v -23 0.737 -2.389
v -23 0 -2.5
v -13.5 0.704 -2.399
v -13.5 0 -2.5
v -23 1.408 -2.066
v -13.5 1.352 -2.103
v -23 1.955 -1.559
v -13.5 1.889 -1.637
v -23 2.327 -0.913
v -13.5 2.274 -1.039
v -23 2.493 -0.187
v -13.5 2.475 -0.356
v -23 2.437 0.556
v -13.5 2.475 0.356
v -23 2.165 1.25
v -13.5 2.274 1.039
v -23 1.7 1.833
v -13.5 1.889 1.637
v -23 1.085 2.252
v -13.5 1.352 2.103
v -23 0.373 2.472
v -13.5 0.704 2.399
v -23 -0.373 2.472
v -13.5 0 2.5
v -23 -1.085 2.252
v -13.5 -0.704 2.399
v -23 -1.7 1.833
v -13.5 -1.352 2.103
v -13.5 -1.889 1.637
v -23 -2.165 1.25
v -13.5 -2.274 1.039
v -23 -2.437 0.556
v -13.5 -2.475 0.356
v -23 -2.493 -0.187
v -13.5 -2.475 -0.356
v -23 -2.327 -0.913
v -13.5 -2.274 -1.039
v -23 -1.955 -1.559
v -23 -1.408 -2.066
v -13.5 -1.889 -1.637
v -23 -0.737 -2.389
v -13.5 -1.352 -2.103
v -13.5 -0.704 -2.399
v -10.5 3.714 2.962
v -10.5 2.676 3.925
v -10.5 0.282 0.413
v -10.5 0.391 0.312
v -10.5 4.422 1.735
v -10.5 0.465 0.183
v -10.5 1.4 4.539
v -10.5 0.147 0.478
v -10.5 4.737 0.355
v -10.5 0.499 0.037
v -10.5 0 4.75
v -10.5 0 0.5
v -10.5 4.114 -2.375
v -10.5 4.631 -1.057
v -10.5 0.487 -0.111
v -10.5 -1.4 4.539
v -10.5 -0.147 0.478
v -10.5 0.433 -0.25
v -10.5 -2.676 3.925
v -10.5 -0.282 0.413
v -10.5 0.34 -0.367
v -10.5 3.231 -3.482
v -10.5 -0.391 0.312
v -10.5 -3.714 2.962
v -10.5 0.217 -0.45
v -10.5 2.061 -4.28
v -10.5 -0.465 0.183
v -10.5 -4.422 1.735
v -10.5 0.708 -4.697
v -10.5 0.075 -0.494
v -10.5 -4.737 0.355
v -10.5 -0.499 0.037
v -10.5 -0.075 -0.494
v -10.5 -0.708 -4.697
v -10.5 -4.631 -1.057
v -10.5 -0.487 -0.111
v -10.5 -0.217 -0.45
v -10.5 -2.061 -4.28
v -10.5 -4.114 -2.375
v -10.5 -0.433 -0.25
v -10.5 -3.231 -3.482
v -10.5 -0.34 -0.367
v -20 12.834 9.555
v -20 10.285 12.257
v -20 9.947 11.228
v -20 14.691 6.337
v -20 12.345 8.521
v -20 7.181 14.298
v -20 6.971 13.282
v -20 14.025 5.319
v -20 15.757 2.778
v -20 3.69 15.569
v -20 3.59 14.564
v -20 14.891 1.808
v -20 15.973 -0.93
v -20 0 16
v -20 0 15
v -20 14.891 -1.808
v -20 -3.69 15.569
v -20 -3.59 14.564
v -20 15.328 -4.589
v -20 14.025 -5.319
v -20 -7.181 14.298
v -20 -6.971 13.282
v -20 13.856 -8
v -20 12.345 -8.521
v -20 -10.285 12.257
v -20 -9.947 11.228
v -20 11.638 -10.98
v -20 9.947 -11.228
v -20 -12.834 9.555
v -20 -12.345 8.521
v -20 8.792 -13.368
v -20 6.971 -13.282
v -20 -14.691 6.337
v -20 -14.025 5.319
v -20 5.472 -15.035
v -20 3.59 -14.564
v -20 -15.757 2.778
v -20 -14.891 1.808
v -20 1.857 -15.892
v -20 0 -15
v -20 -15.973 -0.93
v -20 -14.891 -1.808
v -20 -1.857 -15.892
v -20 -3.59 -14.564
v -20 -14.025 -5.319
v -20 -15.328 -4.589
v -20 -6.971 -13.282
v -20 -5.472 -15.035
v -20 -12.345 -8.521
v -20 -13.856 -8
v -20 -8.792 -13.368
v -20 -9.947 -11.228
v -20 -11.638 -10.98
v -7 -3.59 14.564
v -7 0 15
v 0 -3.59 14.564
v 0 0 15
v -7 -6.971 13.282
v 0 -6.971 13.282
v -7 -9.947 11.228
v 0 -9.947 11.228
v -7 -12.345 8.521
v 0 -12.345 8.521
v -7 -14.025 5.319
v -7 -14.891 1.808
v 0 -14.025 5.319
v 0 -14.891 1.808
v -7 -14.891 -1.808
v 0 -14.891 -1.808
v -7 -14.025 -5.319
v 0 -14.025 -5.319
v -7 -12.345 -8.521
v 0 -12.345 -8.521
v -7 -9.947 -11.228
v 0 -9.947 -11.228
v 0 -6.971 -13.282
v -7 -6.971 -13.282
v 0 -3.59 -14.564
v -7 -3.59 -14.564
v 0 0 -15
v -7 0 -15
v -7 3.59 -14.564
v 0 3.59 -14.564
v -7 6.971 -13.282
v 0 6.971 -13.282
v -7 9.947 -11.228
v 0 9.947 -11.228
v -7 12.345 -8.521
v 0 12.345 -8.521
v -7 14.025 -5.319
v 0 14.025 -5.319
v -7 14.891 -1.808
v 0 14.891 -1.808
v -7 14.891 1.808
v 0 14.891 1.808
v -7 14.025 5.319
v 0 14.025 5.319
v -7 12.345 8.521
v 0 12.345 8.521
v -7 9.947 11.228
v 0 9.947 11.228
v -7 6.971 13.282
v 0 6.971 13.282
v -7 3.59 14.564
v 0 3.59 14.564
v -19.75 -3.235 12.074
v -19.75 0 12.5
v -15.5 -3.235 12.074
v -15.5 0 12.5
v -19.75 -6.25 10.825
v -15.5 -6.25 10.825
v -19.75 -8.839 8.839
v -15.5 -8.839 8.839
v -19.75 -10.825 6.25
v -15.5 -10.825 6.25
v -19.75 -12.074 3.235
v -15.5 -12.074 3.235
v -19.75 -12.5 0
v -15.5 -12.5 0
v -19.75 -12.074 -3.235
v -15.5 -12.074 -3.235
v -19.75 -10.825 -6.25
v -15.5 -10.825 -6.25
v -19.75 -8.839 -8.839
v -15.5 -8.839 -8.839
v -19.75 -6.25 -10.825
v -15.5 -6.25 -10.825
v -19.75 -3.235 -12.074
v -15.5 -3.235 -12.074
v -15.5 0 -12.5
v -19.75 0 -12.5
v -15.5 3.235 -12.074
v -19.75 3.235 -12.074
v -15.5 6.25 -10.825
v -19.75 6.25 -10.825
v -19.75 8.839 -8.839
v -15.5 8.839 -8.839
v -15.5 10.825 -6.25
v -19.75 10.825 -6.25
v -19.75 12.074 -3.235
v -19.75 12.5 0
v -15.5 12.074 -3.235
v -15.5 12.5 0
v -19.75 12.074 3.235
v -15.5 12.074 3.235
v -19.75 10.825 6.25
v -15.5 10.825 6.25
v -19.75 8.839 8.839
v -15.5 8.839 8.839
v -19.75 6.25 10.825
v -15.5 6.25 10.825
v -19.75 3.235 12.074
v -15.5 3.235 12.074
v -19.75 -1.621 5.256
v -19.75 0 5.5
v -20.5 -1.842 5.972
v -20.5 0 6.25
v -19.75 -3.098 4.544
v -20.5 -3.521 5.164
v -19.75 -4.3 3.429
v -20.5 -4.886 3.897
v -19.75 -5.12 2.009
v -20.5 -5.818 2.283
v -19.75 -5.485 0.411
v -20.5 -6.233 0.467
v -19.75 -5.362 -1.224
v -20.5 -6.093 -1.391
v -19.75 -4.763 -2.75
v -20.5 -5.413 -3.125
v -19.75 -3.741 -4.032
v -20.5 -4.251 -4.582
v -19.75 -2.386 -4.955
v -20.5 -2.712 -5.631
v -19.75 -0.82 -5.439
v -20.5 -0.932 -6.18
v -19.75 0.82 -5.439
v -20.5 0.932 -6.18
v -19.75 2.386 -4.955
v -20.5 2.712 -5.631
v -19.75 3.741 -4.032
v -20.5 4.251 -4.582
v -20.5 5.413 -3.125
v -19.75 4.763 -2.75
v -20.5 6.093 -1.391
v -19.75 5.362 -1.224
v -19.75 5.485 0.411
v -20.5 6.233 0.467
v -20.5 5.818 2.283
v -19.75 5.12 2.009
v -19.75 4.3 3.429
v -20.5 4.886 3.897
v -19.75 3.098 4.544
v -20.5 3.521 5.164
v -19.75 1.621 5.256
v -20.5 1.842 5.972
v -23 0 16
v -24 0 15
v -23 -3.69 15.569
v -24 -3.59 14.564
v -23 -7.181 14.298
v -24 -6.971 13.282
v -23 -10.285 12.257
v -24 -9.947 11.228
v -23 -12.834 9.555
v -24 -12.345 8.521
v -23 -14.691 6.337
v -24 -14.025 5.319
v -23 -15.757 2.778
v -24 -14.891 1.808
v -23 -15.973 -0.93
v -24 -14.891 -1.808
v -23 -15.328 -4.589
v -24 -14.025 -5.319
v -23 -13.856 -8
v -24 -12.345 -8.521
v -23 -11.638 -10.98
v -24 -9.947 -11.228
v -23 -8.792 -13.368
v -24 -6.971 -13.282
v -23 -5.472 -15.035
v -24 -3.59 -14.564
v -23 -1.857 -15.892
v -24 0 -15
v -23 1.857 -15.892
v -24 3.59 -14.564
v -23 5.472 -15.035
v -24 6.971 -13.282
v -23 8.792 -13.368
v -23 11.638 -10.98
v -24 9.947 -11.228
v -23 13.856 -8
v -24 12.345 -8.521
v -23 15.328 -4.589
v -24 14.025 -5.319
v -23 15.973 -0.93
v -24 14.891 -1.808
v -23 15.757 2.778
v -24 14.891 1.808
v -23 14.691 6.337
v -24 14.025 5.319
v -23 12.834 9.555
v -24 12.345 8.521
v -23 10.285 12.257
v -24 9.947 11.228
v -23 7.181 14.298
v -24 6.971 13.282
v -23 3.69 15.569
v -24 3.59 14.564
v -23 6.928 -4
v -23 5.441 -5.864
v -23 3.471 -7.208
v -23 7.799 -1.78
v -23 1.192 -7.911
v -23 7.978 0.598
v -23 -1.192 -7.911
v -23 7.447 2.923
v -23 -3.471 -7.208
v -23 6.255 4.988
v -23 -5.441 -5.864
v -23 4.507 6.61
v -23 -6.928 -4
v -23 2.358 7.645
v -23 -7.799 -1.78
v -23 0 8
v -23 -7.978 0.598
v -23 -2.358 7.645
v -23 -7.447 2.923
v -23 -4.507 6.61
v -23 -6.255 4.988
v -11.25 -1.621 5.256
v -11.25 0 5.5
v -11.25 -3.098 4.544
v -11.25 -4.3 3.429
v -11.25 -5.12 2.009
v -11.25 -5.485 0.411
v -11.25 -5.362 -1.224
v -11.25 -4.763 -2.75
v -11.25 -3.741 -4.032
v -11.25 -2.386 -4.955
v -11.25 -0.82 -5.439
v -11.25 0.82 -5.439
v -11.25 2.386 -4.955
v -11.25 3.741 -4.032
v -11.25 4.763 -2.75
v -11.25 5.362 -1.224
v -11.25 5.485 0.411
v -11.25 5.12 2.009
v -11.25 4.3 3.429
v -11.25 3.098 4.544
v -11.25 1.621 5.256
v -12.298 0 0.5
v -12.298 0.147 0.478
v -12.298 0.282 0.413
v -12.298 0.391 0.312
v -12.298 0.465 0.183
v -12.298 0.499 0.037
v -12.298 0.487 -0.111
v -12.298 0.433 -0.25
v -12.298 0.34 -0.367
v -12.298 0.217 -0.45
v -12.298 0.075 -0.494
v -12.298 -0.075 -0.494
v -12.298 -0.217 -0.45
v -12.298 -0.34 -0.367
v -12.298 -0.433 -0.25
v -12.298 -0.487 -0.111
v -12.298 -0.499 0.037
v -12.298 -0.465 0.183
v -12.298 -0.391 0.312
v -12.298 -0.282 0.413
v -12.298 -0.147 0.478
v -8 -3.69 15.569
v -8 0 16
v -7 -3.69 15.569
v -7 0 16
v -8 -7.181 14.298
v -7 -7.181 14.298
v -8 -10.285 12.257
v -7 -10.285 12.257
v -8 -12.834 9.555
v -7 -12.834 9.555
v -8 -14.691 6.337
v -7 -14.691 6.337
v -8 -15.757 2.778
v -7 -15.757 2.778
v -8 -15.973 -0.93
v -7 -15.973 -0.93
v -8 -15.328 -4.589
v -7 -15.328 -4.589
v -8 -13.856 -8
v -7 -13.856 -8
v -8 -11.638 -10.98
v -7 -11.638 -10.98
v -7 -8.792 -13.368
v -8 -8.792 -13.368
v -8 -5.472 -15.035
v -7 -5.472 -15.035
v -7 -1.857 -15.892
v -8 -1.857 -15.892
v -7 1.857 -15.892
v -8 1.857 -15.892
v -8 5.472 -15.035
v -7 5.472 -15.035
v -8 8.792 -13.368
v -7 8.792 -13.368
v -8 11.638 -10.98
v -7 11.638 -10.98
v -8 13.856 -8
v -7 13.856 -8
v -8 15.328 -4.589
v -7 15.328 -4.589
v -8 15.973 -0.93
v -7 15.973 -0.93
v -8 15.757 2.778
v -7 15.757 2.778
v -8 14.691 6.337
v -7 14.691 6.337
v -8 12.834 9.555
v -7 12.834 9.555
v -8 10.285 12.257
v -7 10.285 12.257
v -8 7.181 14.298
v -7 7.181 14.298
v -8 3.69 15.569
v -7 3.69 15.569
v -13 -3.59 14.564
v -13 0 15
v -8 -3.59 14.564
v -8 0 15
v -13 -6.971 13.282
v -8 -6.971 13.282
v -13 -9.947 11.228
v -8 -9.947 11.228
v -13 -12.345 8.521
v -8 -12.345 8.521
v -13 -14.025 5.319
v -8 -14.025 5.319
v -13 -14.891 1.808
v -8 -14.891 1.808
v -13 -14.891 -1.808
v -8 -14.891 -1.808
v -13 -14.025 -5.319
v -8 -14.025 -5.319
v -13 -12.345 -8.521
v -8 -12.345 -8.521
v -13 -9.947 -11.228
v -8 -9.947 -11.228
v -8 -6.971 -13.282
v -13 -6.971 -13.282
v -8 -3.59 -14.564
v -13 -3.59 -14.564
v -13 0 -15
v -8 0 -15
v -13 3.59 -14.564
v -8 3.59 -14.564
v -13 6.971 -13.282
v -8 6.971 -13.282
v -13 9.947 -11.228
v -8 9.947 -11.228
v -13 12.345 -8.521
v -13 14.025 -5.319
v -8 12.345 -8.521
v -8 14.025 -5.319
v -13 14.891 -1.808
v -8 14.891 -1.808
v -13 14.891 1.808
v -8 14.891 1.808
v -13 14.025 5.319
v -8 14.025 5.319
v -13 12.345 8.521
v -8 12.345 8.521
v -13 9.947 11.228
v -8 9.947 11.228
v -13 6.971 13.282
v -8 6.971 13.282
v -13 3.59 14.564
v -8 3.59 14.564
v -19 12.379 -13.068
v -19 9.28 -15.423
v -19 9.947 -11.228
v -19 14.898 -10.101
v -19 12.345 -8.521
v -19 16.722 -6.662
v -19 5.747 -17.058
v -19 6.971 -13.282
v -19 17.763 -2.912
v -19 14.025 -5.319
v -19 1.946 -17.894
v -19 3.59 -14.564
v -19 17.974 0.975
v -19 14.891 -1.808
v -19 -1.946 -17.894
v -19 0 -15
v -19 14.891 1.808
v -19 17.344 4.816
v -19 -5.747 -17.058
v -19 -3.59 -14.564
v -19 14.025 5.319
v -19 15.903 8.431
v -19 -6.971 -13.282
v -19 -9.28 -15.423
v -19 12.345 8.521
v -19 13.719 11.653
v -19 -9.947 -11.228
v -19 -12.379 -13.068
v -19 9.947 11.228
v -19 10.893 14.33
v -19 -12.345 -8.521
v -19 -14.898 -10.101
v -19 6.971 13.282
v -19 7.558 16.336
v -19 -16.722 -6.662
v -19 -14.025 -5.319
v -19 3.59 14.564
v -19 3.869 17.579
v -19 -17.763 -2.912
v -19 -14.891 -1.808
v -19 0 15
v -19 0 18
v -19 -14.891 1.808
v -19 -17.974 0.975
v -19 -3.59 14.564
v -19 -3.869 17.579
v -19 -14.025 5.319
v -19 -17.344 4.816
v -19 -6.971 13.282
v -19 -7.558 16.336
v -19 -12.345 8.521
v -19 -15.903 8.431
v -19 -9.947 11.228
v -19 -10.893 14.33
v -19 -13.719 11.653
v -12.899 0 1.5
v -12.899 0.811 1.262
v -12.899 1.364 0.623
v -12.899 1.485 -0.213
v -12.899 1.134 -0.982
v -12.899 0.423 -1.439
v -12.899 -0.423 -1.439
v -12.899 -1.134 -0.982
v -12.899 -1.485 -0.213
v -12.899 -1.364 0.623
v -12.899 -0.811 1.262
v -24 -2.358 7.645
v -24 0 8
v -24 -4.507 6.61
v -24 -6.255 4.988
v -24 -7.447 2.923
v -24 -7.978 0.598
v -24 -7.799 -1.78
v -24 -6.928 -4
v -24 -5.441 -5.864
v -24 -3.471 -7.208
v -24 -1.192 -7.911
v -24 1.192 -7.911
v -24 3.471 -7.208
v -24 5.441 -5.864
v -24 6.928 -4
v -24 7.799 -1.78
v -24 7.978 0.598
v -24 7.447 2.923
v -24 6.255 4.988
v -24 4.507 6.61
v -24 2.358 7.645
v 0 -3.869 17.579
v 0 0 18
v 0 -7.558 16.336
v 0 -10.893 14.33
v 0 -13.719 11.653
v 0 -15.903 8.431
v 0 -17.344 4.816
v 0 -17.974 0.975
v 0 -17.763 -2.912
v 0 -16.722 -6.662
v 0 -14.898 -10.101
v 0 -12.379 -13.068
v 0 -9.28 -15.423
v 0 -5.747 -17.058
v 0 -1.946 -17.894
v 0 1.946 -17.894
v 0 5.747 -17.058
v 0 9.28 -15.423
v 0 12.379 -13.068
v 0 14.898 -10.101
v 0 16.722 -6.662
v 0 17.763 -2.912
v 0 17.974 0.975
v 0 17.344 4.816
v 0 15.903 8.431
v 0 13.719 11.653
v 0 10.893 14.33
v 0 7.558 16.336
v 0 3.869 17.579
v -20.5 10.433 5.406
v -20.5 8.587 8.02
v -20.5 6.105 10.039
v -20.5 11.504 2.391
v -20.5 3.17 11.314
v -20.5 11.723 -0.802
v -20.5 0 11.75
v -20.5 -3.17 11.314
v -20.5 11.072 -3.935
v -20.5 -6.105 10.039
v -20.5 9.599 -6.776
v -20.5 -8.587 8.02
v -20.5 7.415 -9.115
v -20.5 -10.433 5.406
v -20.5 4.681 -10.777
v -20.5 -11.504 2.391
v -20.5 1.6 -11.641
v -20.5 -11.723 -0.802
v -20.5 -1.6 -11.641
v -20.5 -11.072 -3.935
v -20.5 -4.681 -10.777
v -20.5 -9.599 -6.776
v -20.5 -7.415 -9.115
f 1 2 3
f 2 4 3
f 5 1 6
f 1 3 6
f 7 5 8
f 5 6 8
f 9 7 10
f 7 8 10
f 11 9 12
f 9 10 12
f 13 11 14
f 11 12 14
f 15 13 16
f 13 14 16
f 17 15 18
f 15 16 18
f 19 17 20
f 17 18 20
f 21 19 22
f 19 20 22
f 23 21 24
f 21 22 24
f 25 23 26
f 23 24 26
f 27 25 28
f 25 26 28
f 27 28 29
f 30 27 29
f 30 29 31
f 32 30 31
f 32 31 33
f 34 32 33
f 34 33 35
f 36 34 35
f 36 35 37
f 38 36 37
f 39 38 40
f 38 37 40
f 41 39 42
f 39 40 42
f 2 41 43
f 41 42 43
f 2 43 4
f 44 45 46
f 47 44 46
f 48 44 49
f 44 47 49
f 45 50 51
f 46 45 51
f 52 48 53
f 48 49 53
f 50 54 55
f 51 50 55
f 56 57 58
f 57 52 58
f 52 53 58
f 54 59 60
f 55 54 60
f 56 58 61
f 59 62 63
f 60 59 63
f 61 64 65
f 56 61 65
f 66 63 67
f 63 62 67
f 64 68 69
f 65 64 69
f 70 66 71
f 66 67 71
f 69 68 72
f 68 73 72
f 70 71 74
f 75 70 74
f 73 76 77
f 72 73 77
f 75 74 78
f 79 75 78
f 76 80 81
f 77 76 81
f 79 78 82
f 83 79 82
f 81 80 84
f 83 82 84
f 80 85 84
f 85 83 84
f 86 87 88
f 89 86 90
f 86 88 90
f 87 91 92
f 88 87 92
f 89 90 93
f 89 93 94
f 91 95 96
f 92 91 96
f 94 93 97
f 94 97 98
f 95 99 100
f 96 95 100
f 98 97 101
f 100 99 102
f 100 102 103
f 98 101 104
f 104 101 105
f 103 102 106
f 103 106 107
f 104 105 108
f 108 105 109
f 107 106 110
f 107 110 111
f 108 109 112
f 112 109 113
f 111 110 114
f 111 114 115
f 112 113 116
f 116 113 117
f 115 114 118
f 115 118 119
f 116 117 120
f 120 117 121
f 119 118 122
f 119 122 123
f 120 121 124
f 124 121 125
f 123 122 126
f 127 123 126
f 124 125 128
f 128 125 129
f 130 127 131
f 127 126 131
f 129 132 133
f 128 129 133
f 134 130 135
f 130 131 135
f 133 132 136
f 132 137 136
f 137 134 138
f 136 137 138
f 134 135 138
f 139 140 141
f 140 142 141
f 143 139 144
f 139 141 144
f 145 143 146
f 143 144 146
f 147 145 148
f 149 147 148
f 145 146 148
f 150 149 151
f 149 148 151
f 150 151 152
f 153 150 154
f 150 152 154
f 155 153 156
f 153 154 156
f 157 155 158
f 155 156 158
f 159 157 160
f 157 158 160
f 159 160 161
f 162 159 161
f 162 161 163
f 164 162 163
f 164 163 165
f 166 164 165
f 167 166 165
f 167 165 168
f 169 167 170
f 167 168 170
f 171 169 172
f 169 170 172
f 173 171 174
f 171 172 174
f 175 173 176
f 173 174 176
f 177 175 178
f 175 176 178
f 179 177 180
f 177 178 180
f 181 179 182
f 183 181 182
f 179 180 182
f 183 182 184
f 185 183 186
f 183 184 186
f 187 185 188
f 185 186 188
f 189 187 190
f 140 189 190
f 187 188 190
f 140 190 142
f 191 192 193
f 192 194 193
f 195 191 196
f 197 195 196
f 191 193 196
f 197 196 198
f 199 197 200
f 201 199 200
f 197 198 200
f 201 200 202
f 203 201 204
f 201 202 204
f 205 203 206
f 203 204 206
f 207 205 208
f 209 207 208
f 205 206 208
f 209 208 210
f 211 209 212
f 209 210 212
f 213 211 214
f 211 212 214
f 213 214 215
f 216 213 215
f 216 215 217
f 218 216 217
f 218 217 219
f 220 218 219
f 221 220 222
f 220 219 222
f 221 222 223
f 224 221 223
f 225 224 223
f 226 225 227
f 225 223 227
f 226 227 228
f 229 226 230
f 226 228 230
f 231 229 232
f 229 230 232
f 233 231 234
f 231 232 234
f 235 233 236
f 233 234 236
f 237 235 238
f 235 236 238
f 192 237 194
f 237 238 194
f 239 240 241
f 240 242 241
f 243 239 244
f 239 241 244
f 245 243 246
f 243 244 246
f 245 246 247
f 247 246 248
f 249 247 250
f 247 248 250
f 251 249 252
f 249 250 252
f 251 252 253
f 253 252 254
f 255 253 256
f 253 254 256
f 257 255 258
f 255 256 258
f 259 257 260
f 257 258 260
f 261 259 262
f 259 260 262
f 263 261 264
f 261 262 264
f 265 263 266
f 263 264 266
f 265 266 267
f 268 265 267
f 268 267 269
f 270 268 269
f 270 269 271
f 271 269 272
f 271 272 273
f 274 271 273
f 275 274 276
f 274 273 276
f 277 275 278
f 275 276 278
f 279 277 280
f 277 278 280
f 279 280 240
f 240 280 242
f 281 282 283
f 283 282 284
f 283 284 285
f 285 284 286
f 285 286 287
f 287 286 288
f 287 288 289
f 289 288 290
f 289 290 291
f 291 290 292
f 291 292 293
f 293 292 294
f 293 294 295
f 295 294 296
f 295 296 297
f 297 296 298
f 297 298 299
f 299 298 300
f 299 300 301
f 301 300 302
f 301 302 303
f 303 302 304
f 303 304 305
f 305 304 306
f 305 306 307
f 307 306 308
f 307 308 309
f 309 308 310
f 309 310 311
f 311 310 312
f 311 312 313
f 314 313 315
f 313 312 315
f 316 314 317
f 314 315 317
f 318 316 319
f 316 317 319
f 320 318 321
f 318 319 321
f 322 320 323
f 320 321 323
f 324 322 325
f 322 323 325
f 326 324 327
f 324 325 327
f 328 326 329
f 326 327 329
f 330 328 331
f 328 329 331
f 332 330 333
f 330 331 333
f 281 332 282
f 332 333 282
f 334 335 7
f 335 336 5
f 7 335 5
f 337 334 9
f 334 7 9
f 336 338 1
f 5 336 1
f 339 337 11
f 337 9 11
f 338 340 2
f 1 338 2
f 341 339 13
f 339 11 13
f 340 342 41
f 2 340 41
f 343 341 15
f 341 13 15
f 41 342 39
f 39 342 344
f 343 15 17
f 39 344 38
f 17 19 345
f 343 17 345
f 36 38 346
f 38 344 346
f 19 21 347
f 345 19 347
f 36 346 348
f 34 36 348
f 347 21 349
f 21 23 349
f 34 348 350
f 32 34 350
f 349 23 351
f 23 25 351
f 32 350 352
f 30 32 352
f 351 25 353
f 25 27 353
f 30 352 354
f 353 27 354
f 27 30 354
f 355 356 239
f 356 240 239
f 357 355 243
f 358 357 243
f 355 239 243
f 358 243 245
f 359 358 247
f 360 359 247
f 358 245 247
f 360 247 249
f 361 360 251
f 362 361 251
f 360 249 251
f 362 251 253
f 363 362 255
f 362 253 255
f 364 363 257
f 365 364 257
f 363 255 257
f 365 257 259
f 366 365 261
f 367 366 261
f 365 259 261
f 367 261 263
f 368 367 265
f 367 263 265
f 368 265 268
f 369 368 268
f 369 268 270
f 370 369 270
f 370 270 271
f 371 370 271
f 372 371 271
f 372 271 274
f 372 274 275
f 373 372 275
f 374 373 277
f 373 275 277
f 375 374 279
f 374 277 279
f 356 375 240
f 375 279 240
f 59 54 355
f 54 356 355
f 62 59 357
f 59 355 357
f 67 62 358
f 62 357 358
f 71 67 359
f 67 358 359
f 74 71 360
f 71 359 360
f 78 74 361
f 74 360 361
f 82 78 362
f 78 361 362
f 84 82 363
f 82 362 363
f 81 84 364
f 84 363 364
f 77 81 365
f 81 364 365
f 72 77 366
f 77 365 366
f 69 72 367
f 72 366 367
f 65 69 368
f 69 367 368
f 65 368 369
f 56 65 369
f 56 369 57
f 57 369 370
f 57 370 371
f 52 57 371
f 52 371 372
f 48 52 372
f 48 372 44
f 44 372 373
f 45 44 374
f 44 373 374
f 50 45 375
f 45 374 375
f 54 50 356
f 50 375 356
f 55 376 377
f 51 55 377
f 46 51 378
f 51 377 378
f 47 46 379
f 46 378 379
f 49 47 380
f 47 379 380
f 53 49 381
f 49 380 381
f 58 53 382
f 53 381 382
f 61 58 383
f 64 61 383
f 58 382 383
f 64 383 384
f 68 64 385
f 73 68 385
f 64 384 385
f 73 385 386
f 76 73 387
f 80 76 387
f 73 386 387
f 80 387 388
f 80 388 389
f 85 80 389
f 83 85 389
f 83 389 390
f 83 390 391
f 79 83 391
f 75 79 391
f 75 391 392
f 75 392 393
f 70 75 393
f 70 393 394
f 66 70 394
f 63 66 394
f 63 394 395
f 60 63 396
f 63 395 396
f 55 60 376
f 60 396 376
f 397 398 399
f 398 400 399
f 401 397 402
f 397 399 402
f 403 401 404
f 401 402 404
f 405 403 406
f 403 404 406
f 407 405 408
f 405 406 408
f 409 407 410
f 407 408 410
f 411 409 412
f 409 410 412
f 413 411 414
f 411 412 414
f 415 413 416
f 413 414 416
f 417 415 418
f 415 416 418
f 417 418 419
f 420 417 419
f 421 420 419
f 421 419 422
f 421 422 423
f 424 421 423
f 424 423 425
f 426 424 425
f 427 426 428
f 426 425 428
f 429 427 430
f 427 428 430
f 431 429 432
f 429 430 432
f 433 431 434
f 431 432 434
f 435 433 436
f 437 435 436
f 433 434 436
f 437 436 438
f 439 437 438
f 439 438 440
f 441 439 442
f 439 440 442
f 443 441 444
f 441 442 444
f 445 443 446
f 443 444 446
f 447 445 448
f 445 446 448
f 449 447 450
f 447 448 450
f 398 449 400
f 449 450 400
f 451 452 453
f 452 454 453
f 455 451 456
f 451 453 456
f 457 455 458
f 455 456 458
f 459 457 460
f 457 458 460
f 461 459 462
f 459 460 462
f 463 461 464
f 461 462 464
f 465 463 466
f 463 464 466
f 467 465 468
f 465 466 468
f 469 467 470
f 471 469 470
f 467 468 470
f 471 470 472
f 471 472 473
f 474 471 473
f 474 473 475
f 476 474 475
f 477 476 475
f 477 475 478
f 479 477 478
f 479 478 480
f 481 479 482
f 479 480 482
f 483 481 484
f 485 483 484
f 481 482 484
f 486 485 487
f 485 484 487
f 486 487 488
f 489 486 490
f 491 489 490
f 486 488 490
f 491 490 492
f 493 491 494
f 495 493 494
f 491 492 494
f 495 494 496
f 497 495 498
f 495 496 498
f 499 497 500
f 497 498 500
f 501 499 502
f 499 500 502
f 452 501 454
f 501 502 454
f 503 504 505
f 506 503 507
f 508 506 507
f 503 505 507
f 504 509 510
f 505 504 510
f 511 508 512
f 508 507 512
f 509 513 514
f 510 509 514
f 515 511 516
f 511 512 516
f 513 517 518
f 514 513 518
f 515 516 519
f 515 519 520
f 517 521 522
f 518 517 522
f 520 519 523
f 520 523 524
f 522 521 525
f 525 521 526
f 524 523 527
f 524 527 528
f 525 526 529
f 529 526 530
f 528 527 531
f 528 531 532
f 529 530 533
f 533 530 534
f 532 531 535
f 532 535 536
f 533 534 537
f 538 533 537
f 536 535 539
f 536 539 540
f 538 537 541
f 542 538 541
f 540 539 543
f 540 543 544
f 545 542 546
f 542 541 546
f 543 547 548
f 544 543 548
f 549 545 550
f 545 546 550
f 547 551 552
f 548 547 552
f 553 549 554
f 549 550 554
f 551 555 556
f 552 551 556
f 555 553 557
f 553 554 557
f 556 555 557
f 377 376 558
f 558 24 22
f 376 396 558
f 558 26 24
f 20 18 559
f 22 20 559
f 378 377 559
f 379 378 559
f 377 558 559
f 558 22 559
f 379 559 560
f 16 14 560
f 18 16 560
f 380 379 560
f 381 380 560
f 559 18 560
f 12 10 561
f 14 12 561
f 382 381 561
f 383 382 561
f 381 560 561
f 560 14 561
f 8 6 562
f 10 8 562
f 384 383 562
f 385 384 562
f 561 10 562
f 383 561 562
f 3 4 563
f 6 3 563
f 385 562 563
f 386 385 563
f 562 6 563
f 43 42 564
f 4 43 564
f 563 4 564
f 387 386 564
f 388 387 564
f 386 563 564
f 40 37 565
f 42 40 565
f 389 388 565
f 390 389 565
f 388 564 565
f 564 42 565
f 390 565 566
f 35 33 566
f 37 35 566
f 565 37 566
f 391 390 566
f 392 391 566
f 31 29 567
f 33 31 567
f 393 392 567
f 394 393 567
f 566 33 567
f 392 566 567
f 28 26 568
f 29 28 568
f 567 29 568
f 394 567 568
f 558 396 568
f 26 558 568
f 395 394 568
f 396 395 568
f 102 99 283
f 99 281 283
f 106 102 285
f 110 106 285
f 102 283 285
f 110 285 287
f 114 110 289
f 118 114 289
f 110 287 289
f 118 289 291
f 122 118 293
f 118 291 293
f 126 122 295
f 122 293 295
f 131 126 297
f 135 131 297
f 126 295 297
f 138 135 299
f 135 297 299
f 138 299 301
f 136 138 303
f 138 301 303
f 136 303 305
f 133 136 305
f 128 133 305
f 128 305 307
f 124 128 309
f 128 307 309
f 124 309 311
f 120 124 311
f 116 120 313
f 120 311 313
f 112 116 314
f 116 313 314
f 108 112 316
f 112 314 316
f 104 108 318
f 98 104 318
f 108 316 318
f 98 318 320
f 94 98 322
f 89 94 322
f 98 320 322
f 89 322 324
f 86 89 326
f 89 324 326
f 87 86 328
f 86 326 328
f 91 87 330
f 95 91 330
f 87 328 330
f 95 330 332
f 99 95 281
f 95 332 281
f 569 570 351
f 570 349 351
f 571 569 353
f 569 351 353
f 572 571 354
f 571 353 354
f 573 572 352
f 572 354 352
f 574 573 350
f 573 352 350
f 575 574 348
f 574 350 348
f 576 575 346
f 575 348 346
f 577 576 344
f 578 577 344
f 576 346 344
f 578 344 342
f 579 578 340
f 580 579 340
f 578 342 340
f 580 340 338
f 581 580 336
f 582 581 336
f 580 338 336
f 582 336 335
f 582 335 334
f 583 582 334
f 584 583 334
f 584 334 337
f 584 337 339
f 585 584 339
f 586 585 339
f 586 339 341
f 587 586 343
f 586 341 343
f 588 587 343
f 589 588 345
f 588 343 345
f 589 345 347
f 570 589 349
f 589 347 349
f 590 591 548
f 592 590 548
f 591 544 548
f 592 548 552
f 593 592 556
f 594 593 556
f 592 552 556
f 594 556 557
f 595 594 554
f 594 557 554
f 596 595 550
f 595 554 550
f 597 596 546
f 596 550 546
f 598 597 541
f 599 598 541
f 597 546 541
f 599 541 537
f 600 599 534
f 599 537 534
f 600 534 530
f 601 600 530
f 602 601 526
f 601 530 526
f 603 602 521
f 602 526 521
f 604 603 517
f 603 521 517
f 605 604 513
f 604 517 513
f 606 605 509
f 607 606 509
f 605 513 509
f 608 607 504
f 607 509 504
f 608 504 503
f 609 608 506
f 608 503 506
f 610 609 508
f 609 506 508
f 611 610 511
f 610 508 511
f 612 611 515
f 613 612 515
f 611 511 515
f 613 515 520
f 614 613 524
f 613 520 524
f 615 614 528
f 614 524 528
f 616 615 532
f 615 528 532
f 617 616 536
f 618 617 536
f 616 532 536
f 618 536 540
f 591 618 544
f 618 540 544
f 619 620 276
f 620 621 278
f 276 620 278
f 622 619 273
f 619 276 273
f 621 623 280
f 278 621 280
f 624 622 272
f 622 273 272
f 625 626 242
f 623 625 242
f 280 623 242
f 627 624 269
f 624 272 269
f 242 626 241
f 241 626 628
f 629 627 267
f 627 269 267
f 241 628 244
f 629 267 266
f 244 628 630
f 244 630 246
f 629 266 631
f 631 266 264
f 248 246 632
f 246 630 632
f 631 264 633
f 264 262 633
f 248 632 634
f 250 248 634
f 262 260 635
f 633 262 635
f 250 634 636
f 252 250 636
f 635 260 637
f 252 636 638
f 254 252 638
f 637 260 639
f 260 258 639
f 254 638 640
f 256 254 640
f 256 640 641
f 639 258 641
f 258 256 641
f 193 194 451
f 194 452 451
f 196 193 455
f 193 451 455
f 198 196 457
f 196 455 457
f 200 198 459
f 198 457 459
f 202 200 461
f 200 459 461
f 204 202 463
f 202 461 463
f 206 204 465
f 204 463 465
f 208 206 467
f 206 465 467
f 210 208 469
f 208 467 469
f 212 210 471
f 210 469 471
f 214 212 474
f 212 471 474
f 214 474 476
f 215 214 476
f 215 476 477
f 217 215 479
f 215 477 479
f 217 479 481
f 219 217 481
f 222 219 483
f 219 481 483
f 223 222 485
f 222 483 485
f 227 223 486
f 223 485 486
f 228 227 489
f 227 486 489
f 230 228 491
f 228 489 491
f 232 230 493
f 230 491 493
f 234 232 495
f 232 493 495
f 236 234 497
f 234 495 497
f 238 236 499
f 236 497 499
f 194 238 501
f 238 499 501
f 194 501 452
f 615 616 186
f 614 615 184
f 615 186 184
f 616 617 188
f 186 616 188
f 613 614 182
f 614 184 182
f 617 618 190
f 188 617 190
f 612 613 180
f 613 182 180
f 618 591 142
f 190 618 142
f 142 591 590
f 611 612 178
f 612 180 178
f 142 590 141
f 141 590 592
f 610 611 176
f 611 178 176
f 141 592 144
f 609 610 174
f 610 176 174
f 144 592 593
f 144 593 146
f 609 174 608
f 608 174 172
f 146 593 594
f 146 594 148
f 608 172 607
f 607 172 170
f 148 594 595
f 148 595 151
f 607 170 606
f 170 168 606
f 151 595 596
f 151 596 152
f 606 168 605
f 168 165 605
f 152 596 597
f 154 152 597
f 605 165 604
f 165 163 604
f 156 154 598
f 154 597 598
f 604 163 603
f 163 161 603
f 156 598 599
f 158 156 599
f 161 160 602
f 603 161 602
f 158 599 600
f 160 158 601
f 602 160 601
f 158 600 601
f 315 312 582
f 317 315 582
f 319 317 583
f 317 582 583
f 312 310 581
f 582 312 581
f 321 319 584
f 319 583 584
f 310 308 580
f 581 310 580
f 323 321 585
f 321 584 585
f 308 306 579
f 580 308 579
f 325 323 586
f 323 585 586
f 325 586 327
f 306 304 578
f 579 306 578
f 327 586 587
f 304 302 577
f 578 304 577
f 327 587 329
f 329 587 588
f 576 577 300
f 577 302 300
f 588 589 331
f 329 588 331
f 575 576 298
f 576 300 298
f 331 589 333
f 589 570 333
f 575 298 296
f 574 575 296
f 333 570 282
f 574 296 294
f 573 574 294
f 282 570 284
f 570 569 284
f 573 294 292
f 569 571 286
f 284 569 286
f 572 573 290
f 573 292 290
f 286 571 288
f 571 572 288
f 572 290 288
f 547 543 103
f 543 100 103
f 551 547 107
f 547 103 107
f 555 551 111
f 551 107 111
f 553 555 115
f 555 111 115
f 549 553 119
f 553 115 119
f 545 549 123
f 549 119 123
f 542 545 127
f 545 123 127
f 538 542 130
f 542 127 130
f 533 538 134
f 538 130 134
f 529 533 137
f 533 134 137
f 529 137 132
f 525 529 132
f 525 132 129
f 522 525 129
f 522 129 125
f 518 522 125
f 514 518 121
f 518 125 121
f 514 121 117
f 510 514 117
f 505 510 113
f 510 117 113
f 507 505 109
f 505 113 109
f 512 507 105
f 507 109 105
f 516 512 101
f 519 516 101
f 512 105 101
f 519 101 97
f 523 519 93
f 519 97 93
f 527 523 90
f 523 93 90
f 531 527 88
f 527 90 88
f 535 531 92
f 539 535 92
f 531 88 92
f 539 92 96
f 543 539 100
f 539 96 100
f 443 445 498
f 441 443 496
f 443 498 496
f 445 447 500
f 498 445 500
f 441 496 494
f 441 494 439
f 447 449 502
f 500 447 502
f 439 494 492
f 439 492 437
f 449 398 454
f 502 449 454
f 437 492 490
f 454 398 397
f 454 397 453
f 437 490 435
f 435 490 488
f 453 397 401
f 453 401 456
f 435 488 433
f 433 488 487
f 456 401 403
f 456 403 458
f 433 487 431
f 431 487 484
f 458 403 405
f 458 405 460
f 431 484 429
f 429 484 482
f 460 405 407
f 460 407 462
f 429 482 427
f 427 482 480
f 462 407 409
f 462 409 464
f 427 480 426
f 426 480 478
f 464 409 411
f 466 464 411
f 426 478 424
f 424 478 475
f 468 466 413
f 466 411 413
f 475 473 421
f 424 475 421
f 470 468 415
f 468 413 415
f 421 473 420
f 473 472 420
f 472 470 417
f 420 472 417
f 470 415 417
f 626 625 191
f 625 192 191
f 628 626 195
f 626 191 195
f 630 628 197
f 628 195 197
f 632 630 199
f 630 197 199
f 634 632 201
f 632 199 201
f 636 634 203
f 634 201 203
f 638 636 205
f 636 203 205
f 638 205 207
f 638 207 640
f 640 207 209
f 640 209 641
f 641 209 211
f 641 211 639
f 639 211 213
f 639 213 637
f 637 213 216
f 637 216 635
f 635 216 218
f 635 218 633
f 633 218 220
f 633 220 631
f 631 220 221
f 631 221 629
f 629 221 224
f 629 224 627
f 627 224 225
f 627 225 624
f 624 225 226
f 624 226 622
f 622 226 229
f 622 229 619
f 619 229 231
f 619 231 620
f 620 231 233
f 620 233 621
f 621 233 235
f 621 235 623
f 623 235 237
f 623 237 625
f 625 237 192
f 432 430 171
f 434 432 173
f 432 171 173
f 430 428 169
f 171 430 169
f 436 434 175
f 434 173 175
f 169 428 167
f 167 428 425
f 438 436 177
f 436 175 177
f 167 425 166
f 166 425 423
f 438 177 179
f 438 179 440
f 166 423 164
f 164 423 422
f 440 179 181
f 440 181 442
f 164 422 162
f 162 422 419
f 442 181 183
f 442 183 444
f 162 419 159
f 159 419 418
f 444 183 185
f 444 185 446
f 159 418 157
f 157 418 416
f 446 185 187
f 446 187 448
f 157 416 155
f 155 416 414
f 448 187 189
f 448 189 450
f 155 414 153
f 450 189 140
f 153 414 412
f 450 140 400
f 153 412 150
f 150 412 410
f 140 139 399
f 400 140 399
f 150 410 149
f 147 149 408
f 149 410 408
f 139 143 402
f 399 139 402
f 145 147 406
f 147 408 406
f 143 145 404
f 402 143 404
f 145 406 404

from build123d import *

# Parameters (mm, degrees)
DIAM_TRE_DU_PER_AGE_1_0_1_1_D     = 1
DIAM_TRE_DU_PER_AGE_1_0_1_1_DEPTH = 2
DIAM_TRE_DU_PER_AGE_1_0_1_1_TIP   = 0.30043031
DIAM_TRE_DU_PER_AGE_5_0_5_1_D     = 5
DIAM_TRE_DU_PER_AGE_5_0_5_1_DEPTH = 9.5
DIAM_TRE_DU_PER_AGE_5_0_5_1_TIP   = 1.502151548


with BuildPart() as part:
    # Esquisse7 → Révolution2 (revolve)
    with BuildSketch(Plane.XY, mode=Mode.PRIVATE) as r_volution2_sk:
        Polygon((0, 15), (0, 18), (-19, 18), (-19, 15), (-20, 15), (-20, 16), (-23, 16), (-24, 15), (-24, 8), (-23, 8), (-23, 0), (-10.5, 0), (-10.5, 4.75), (-11.25, 5.5), (-19.75, 5.5), (-20.5, 6.25), (-20.5, 11.75), (-19.75, 12.5), (-15.5, 12.5), (-13, 15), (-8, 15), (-8, 16), (-7, 16), (-7, 15), align=None)
    revolve(r_volution2_sk.sketch.rotate(Axis((-24, 0, 0), (1, 0, 0)), 90), axis=Axis((-24, 0, 0), (1, 0, 0)))

    # Diamètre du perçage Ø1.0 (1)1
    with Locations(Plane(origin=(-10.5, 0, 0), x_dir=(0, 0, -1), z_dir=(1, 0, 0))):
        with Locations((0, 0)):
            Hole(DIAM_TRE_DU_PER_AGE_1_0_1_1_D / 2, depth=DIAM_TRE_DU_PER_AGE_1_0_1_1_DEPTH)
            with Locations((0, 0, -(DIAM_TRE_DU_PER_AGE_1_0_1_1_DEPTH + DIAM_TRE_DU_PER_AGE_1_0_1_1_TIP / 2))):  # 118° drill point
                Cone(0, DIAM_TRE_DU_PER_AGE_1_0_1_1_D / 2, DIAM_TRE_DU_PER_AGE_1_0_1_1_TIP, mode=Mode.SUBTRACT)

    # Diamètre du perçage Ø5.0 (5)1
    with Locations(Plane.ZY.offset(23)):
        with Locations((0, 0)):
            Hole(DIAM_TRE_DU_PER_AGE_5_0_5_1_D / 2, depth=DIAM_TRE_DU_PER_AGE_5_0_5_1_DEPTH)
            with Locations((0, 0, -(DIAM_TRE_DU_PER_AGE_5_0_5_1_DEPTH + DIAM_TRE_DU_PER_AGE_5_0_5_1_TIP / 2))):  # 118° drill point
                Cone(0, DIAM_TRE_DU_PER_AGE_5_0_5_1_D / 2, DIAM_TRE_DU_PER_AGE_5_0_5_1_TIP, mode=Mode.SUBTRACT)


solid = part.part
